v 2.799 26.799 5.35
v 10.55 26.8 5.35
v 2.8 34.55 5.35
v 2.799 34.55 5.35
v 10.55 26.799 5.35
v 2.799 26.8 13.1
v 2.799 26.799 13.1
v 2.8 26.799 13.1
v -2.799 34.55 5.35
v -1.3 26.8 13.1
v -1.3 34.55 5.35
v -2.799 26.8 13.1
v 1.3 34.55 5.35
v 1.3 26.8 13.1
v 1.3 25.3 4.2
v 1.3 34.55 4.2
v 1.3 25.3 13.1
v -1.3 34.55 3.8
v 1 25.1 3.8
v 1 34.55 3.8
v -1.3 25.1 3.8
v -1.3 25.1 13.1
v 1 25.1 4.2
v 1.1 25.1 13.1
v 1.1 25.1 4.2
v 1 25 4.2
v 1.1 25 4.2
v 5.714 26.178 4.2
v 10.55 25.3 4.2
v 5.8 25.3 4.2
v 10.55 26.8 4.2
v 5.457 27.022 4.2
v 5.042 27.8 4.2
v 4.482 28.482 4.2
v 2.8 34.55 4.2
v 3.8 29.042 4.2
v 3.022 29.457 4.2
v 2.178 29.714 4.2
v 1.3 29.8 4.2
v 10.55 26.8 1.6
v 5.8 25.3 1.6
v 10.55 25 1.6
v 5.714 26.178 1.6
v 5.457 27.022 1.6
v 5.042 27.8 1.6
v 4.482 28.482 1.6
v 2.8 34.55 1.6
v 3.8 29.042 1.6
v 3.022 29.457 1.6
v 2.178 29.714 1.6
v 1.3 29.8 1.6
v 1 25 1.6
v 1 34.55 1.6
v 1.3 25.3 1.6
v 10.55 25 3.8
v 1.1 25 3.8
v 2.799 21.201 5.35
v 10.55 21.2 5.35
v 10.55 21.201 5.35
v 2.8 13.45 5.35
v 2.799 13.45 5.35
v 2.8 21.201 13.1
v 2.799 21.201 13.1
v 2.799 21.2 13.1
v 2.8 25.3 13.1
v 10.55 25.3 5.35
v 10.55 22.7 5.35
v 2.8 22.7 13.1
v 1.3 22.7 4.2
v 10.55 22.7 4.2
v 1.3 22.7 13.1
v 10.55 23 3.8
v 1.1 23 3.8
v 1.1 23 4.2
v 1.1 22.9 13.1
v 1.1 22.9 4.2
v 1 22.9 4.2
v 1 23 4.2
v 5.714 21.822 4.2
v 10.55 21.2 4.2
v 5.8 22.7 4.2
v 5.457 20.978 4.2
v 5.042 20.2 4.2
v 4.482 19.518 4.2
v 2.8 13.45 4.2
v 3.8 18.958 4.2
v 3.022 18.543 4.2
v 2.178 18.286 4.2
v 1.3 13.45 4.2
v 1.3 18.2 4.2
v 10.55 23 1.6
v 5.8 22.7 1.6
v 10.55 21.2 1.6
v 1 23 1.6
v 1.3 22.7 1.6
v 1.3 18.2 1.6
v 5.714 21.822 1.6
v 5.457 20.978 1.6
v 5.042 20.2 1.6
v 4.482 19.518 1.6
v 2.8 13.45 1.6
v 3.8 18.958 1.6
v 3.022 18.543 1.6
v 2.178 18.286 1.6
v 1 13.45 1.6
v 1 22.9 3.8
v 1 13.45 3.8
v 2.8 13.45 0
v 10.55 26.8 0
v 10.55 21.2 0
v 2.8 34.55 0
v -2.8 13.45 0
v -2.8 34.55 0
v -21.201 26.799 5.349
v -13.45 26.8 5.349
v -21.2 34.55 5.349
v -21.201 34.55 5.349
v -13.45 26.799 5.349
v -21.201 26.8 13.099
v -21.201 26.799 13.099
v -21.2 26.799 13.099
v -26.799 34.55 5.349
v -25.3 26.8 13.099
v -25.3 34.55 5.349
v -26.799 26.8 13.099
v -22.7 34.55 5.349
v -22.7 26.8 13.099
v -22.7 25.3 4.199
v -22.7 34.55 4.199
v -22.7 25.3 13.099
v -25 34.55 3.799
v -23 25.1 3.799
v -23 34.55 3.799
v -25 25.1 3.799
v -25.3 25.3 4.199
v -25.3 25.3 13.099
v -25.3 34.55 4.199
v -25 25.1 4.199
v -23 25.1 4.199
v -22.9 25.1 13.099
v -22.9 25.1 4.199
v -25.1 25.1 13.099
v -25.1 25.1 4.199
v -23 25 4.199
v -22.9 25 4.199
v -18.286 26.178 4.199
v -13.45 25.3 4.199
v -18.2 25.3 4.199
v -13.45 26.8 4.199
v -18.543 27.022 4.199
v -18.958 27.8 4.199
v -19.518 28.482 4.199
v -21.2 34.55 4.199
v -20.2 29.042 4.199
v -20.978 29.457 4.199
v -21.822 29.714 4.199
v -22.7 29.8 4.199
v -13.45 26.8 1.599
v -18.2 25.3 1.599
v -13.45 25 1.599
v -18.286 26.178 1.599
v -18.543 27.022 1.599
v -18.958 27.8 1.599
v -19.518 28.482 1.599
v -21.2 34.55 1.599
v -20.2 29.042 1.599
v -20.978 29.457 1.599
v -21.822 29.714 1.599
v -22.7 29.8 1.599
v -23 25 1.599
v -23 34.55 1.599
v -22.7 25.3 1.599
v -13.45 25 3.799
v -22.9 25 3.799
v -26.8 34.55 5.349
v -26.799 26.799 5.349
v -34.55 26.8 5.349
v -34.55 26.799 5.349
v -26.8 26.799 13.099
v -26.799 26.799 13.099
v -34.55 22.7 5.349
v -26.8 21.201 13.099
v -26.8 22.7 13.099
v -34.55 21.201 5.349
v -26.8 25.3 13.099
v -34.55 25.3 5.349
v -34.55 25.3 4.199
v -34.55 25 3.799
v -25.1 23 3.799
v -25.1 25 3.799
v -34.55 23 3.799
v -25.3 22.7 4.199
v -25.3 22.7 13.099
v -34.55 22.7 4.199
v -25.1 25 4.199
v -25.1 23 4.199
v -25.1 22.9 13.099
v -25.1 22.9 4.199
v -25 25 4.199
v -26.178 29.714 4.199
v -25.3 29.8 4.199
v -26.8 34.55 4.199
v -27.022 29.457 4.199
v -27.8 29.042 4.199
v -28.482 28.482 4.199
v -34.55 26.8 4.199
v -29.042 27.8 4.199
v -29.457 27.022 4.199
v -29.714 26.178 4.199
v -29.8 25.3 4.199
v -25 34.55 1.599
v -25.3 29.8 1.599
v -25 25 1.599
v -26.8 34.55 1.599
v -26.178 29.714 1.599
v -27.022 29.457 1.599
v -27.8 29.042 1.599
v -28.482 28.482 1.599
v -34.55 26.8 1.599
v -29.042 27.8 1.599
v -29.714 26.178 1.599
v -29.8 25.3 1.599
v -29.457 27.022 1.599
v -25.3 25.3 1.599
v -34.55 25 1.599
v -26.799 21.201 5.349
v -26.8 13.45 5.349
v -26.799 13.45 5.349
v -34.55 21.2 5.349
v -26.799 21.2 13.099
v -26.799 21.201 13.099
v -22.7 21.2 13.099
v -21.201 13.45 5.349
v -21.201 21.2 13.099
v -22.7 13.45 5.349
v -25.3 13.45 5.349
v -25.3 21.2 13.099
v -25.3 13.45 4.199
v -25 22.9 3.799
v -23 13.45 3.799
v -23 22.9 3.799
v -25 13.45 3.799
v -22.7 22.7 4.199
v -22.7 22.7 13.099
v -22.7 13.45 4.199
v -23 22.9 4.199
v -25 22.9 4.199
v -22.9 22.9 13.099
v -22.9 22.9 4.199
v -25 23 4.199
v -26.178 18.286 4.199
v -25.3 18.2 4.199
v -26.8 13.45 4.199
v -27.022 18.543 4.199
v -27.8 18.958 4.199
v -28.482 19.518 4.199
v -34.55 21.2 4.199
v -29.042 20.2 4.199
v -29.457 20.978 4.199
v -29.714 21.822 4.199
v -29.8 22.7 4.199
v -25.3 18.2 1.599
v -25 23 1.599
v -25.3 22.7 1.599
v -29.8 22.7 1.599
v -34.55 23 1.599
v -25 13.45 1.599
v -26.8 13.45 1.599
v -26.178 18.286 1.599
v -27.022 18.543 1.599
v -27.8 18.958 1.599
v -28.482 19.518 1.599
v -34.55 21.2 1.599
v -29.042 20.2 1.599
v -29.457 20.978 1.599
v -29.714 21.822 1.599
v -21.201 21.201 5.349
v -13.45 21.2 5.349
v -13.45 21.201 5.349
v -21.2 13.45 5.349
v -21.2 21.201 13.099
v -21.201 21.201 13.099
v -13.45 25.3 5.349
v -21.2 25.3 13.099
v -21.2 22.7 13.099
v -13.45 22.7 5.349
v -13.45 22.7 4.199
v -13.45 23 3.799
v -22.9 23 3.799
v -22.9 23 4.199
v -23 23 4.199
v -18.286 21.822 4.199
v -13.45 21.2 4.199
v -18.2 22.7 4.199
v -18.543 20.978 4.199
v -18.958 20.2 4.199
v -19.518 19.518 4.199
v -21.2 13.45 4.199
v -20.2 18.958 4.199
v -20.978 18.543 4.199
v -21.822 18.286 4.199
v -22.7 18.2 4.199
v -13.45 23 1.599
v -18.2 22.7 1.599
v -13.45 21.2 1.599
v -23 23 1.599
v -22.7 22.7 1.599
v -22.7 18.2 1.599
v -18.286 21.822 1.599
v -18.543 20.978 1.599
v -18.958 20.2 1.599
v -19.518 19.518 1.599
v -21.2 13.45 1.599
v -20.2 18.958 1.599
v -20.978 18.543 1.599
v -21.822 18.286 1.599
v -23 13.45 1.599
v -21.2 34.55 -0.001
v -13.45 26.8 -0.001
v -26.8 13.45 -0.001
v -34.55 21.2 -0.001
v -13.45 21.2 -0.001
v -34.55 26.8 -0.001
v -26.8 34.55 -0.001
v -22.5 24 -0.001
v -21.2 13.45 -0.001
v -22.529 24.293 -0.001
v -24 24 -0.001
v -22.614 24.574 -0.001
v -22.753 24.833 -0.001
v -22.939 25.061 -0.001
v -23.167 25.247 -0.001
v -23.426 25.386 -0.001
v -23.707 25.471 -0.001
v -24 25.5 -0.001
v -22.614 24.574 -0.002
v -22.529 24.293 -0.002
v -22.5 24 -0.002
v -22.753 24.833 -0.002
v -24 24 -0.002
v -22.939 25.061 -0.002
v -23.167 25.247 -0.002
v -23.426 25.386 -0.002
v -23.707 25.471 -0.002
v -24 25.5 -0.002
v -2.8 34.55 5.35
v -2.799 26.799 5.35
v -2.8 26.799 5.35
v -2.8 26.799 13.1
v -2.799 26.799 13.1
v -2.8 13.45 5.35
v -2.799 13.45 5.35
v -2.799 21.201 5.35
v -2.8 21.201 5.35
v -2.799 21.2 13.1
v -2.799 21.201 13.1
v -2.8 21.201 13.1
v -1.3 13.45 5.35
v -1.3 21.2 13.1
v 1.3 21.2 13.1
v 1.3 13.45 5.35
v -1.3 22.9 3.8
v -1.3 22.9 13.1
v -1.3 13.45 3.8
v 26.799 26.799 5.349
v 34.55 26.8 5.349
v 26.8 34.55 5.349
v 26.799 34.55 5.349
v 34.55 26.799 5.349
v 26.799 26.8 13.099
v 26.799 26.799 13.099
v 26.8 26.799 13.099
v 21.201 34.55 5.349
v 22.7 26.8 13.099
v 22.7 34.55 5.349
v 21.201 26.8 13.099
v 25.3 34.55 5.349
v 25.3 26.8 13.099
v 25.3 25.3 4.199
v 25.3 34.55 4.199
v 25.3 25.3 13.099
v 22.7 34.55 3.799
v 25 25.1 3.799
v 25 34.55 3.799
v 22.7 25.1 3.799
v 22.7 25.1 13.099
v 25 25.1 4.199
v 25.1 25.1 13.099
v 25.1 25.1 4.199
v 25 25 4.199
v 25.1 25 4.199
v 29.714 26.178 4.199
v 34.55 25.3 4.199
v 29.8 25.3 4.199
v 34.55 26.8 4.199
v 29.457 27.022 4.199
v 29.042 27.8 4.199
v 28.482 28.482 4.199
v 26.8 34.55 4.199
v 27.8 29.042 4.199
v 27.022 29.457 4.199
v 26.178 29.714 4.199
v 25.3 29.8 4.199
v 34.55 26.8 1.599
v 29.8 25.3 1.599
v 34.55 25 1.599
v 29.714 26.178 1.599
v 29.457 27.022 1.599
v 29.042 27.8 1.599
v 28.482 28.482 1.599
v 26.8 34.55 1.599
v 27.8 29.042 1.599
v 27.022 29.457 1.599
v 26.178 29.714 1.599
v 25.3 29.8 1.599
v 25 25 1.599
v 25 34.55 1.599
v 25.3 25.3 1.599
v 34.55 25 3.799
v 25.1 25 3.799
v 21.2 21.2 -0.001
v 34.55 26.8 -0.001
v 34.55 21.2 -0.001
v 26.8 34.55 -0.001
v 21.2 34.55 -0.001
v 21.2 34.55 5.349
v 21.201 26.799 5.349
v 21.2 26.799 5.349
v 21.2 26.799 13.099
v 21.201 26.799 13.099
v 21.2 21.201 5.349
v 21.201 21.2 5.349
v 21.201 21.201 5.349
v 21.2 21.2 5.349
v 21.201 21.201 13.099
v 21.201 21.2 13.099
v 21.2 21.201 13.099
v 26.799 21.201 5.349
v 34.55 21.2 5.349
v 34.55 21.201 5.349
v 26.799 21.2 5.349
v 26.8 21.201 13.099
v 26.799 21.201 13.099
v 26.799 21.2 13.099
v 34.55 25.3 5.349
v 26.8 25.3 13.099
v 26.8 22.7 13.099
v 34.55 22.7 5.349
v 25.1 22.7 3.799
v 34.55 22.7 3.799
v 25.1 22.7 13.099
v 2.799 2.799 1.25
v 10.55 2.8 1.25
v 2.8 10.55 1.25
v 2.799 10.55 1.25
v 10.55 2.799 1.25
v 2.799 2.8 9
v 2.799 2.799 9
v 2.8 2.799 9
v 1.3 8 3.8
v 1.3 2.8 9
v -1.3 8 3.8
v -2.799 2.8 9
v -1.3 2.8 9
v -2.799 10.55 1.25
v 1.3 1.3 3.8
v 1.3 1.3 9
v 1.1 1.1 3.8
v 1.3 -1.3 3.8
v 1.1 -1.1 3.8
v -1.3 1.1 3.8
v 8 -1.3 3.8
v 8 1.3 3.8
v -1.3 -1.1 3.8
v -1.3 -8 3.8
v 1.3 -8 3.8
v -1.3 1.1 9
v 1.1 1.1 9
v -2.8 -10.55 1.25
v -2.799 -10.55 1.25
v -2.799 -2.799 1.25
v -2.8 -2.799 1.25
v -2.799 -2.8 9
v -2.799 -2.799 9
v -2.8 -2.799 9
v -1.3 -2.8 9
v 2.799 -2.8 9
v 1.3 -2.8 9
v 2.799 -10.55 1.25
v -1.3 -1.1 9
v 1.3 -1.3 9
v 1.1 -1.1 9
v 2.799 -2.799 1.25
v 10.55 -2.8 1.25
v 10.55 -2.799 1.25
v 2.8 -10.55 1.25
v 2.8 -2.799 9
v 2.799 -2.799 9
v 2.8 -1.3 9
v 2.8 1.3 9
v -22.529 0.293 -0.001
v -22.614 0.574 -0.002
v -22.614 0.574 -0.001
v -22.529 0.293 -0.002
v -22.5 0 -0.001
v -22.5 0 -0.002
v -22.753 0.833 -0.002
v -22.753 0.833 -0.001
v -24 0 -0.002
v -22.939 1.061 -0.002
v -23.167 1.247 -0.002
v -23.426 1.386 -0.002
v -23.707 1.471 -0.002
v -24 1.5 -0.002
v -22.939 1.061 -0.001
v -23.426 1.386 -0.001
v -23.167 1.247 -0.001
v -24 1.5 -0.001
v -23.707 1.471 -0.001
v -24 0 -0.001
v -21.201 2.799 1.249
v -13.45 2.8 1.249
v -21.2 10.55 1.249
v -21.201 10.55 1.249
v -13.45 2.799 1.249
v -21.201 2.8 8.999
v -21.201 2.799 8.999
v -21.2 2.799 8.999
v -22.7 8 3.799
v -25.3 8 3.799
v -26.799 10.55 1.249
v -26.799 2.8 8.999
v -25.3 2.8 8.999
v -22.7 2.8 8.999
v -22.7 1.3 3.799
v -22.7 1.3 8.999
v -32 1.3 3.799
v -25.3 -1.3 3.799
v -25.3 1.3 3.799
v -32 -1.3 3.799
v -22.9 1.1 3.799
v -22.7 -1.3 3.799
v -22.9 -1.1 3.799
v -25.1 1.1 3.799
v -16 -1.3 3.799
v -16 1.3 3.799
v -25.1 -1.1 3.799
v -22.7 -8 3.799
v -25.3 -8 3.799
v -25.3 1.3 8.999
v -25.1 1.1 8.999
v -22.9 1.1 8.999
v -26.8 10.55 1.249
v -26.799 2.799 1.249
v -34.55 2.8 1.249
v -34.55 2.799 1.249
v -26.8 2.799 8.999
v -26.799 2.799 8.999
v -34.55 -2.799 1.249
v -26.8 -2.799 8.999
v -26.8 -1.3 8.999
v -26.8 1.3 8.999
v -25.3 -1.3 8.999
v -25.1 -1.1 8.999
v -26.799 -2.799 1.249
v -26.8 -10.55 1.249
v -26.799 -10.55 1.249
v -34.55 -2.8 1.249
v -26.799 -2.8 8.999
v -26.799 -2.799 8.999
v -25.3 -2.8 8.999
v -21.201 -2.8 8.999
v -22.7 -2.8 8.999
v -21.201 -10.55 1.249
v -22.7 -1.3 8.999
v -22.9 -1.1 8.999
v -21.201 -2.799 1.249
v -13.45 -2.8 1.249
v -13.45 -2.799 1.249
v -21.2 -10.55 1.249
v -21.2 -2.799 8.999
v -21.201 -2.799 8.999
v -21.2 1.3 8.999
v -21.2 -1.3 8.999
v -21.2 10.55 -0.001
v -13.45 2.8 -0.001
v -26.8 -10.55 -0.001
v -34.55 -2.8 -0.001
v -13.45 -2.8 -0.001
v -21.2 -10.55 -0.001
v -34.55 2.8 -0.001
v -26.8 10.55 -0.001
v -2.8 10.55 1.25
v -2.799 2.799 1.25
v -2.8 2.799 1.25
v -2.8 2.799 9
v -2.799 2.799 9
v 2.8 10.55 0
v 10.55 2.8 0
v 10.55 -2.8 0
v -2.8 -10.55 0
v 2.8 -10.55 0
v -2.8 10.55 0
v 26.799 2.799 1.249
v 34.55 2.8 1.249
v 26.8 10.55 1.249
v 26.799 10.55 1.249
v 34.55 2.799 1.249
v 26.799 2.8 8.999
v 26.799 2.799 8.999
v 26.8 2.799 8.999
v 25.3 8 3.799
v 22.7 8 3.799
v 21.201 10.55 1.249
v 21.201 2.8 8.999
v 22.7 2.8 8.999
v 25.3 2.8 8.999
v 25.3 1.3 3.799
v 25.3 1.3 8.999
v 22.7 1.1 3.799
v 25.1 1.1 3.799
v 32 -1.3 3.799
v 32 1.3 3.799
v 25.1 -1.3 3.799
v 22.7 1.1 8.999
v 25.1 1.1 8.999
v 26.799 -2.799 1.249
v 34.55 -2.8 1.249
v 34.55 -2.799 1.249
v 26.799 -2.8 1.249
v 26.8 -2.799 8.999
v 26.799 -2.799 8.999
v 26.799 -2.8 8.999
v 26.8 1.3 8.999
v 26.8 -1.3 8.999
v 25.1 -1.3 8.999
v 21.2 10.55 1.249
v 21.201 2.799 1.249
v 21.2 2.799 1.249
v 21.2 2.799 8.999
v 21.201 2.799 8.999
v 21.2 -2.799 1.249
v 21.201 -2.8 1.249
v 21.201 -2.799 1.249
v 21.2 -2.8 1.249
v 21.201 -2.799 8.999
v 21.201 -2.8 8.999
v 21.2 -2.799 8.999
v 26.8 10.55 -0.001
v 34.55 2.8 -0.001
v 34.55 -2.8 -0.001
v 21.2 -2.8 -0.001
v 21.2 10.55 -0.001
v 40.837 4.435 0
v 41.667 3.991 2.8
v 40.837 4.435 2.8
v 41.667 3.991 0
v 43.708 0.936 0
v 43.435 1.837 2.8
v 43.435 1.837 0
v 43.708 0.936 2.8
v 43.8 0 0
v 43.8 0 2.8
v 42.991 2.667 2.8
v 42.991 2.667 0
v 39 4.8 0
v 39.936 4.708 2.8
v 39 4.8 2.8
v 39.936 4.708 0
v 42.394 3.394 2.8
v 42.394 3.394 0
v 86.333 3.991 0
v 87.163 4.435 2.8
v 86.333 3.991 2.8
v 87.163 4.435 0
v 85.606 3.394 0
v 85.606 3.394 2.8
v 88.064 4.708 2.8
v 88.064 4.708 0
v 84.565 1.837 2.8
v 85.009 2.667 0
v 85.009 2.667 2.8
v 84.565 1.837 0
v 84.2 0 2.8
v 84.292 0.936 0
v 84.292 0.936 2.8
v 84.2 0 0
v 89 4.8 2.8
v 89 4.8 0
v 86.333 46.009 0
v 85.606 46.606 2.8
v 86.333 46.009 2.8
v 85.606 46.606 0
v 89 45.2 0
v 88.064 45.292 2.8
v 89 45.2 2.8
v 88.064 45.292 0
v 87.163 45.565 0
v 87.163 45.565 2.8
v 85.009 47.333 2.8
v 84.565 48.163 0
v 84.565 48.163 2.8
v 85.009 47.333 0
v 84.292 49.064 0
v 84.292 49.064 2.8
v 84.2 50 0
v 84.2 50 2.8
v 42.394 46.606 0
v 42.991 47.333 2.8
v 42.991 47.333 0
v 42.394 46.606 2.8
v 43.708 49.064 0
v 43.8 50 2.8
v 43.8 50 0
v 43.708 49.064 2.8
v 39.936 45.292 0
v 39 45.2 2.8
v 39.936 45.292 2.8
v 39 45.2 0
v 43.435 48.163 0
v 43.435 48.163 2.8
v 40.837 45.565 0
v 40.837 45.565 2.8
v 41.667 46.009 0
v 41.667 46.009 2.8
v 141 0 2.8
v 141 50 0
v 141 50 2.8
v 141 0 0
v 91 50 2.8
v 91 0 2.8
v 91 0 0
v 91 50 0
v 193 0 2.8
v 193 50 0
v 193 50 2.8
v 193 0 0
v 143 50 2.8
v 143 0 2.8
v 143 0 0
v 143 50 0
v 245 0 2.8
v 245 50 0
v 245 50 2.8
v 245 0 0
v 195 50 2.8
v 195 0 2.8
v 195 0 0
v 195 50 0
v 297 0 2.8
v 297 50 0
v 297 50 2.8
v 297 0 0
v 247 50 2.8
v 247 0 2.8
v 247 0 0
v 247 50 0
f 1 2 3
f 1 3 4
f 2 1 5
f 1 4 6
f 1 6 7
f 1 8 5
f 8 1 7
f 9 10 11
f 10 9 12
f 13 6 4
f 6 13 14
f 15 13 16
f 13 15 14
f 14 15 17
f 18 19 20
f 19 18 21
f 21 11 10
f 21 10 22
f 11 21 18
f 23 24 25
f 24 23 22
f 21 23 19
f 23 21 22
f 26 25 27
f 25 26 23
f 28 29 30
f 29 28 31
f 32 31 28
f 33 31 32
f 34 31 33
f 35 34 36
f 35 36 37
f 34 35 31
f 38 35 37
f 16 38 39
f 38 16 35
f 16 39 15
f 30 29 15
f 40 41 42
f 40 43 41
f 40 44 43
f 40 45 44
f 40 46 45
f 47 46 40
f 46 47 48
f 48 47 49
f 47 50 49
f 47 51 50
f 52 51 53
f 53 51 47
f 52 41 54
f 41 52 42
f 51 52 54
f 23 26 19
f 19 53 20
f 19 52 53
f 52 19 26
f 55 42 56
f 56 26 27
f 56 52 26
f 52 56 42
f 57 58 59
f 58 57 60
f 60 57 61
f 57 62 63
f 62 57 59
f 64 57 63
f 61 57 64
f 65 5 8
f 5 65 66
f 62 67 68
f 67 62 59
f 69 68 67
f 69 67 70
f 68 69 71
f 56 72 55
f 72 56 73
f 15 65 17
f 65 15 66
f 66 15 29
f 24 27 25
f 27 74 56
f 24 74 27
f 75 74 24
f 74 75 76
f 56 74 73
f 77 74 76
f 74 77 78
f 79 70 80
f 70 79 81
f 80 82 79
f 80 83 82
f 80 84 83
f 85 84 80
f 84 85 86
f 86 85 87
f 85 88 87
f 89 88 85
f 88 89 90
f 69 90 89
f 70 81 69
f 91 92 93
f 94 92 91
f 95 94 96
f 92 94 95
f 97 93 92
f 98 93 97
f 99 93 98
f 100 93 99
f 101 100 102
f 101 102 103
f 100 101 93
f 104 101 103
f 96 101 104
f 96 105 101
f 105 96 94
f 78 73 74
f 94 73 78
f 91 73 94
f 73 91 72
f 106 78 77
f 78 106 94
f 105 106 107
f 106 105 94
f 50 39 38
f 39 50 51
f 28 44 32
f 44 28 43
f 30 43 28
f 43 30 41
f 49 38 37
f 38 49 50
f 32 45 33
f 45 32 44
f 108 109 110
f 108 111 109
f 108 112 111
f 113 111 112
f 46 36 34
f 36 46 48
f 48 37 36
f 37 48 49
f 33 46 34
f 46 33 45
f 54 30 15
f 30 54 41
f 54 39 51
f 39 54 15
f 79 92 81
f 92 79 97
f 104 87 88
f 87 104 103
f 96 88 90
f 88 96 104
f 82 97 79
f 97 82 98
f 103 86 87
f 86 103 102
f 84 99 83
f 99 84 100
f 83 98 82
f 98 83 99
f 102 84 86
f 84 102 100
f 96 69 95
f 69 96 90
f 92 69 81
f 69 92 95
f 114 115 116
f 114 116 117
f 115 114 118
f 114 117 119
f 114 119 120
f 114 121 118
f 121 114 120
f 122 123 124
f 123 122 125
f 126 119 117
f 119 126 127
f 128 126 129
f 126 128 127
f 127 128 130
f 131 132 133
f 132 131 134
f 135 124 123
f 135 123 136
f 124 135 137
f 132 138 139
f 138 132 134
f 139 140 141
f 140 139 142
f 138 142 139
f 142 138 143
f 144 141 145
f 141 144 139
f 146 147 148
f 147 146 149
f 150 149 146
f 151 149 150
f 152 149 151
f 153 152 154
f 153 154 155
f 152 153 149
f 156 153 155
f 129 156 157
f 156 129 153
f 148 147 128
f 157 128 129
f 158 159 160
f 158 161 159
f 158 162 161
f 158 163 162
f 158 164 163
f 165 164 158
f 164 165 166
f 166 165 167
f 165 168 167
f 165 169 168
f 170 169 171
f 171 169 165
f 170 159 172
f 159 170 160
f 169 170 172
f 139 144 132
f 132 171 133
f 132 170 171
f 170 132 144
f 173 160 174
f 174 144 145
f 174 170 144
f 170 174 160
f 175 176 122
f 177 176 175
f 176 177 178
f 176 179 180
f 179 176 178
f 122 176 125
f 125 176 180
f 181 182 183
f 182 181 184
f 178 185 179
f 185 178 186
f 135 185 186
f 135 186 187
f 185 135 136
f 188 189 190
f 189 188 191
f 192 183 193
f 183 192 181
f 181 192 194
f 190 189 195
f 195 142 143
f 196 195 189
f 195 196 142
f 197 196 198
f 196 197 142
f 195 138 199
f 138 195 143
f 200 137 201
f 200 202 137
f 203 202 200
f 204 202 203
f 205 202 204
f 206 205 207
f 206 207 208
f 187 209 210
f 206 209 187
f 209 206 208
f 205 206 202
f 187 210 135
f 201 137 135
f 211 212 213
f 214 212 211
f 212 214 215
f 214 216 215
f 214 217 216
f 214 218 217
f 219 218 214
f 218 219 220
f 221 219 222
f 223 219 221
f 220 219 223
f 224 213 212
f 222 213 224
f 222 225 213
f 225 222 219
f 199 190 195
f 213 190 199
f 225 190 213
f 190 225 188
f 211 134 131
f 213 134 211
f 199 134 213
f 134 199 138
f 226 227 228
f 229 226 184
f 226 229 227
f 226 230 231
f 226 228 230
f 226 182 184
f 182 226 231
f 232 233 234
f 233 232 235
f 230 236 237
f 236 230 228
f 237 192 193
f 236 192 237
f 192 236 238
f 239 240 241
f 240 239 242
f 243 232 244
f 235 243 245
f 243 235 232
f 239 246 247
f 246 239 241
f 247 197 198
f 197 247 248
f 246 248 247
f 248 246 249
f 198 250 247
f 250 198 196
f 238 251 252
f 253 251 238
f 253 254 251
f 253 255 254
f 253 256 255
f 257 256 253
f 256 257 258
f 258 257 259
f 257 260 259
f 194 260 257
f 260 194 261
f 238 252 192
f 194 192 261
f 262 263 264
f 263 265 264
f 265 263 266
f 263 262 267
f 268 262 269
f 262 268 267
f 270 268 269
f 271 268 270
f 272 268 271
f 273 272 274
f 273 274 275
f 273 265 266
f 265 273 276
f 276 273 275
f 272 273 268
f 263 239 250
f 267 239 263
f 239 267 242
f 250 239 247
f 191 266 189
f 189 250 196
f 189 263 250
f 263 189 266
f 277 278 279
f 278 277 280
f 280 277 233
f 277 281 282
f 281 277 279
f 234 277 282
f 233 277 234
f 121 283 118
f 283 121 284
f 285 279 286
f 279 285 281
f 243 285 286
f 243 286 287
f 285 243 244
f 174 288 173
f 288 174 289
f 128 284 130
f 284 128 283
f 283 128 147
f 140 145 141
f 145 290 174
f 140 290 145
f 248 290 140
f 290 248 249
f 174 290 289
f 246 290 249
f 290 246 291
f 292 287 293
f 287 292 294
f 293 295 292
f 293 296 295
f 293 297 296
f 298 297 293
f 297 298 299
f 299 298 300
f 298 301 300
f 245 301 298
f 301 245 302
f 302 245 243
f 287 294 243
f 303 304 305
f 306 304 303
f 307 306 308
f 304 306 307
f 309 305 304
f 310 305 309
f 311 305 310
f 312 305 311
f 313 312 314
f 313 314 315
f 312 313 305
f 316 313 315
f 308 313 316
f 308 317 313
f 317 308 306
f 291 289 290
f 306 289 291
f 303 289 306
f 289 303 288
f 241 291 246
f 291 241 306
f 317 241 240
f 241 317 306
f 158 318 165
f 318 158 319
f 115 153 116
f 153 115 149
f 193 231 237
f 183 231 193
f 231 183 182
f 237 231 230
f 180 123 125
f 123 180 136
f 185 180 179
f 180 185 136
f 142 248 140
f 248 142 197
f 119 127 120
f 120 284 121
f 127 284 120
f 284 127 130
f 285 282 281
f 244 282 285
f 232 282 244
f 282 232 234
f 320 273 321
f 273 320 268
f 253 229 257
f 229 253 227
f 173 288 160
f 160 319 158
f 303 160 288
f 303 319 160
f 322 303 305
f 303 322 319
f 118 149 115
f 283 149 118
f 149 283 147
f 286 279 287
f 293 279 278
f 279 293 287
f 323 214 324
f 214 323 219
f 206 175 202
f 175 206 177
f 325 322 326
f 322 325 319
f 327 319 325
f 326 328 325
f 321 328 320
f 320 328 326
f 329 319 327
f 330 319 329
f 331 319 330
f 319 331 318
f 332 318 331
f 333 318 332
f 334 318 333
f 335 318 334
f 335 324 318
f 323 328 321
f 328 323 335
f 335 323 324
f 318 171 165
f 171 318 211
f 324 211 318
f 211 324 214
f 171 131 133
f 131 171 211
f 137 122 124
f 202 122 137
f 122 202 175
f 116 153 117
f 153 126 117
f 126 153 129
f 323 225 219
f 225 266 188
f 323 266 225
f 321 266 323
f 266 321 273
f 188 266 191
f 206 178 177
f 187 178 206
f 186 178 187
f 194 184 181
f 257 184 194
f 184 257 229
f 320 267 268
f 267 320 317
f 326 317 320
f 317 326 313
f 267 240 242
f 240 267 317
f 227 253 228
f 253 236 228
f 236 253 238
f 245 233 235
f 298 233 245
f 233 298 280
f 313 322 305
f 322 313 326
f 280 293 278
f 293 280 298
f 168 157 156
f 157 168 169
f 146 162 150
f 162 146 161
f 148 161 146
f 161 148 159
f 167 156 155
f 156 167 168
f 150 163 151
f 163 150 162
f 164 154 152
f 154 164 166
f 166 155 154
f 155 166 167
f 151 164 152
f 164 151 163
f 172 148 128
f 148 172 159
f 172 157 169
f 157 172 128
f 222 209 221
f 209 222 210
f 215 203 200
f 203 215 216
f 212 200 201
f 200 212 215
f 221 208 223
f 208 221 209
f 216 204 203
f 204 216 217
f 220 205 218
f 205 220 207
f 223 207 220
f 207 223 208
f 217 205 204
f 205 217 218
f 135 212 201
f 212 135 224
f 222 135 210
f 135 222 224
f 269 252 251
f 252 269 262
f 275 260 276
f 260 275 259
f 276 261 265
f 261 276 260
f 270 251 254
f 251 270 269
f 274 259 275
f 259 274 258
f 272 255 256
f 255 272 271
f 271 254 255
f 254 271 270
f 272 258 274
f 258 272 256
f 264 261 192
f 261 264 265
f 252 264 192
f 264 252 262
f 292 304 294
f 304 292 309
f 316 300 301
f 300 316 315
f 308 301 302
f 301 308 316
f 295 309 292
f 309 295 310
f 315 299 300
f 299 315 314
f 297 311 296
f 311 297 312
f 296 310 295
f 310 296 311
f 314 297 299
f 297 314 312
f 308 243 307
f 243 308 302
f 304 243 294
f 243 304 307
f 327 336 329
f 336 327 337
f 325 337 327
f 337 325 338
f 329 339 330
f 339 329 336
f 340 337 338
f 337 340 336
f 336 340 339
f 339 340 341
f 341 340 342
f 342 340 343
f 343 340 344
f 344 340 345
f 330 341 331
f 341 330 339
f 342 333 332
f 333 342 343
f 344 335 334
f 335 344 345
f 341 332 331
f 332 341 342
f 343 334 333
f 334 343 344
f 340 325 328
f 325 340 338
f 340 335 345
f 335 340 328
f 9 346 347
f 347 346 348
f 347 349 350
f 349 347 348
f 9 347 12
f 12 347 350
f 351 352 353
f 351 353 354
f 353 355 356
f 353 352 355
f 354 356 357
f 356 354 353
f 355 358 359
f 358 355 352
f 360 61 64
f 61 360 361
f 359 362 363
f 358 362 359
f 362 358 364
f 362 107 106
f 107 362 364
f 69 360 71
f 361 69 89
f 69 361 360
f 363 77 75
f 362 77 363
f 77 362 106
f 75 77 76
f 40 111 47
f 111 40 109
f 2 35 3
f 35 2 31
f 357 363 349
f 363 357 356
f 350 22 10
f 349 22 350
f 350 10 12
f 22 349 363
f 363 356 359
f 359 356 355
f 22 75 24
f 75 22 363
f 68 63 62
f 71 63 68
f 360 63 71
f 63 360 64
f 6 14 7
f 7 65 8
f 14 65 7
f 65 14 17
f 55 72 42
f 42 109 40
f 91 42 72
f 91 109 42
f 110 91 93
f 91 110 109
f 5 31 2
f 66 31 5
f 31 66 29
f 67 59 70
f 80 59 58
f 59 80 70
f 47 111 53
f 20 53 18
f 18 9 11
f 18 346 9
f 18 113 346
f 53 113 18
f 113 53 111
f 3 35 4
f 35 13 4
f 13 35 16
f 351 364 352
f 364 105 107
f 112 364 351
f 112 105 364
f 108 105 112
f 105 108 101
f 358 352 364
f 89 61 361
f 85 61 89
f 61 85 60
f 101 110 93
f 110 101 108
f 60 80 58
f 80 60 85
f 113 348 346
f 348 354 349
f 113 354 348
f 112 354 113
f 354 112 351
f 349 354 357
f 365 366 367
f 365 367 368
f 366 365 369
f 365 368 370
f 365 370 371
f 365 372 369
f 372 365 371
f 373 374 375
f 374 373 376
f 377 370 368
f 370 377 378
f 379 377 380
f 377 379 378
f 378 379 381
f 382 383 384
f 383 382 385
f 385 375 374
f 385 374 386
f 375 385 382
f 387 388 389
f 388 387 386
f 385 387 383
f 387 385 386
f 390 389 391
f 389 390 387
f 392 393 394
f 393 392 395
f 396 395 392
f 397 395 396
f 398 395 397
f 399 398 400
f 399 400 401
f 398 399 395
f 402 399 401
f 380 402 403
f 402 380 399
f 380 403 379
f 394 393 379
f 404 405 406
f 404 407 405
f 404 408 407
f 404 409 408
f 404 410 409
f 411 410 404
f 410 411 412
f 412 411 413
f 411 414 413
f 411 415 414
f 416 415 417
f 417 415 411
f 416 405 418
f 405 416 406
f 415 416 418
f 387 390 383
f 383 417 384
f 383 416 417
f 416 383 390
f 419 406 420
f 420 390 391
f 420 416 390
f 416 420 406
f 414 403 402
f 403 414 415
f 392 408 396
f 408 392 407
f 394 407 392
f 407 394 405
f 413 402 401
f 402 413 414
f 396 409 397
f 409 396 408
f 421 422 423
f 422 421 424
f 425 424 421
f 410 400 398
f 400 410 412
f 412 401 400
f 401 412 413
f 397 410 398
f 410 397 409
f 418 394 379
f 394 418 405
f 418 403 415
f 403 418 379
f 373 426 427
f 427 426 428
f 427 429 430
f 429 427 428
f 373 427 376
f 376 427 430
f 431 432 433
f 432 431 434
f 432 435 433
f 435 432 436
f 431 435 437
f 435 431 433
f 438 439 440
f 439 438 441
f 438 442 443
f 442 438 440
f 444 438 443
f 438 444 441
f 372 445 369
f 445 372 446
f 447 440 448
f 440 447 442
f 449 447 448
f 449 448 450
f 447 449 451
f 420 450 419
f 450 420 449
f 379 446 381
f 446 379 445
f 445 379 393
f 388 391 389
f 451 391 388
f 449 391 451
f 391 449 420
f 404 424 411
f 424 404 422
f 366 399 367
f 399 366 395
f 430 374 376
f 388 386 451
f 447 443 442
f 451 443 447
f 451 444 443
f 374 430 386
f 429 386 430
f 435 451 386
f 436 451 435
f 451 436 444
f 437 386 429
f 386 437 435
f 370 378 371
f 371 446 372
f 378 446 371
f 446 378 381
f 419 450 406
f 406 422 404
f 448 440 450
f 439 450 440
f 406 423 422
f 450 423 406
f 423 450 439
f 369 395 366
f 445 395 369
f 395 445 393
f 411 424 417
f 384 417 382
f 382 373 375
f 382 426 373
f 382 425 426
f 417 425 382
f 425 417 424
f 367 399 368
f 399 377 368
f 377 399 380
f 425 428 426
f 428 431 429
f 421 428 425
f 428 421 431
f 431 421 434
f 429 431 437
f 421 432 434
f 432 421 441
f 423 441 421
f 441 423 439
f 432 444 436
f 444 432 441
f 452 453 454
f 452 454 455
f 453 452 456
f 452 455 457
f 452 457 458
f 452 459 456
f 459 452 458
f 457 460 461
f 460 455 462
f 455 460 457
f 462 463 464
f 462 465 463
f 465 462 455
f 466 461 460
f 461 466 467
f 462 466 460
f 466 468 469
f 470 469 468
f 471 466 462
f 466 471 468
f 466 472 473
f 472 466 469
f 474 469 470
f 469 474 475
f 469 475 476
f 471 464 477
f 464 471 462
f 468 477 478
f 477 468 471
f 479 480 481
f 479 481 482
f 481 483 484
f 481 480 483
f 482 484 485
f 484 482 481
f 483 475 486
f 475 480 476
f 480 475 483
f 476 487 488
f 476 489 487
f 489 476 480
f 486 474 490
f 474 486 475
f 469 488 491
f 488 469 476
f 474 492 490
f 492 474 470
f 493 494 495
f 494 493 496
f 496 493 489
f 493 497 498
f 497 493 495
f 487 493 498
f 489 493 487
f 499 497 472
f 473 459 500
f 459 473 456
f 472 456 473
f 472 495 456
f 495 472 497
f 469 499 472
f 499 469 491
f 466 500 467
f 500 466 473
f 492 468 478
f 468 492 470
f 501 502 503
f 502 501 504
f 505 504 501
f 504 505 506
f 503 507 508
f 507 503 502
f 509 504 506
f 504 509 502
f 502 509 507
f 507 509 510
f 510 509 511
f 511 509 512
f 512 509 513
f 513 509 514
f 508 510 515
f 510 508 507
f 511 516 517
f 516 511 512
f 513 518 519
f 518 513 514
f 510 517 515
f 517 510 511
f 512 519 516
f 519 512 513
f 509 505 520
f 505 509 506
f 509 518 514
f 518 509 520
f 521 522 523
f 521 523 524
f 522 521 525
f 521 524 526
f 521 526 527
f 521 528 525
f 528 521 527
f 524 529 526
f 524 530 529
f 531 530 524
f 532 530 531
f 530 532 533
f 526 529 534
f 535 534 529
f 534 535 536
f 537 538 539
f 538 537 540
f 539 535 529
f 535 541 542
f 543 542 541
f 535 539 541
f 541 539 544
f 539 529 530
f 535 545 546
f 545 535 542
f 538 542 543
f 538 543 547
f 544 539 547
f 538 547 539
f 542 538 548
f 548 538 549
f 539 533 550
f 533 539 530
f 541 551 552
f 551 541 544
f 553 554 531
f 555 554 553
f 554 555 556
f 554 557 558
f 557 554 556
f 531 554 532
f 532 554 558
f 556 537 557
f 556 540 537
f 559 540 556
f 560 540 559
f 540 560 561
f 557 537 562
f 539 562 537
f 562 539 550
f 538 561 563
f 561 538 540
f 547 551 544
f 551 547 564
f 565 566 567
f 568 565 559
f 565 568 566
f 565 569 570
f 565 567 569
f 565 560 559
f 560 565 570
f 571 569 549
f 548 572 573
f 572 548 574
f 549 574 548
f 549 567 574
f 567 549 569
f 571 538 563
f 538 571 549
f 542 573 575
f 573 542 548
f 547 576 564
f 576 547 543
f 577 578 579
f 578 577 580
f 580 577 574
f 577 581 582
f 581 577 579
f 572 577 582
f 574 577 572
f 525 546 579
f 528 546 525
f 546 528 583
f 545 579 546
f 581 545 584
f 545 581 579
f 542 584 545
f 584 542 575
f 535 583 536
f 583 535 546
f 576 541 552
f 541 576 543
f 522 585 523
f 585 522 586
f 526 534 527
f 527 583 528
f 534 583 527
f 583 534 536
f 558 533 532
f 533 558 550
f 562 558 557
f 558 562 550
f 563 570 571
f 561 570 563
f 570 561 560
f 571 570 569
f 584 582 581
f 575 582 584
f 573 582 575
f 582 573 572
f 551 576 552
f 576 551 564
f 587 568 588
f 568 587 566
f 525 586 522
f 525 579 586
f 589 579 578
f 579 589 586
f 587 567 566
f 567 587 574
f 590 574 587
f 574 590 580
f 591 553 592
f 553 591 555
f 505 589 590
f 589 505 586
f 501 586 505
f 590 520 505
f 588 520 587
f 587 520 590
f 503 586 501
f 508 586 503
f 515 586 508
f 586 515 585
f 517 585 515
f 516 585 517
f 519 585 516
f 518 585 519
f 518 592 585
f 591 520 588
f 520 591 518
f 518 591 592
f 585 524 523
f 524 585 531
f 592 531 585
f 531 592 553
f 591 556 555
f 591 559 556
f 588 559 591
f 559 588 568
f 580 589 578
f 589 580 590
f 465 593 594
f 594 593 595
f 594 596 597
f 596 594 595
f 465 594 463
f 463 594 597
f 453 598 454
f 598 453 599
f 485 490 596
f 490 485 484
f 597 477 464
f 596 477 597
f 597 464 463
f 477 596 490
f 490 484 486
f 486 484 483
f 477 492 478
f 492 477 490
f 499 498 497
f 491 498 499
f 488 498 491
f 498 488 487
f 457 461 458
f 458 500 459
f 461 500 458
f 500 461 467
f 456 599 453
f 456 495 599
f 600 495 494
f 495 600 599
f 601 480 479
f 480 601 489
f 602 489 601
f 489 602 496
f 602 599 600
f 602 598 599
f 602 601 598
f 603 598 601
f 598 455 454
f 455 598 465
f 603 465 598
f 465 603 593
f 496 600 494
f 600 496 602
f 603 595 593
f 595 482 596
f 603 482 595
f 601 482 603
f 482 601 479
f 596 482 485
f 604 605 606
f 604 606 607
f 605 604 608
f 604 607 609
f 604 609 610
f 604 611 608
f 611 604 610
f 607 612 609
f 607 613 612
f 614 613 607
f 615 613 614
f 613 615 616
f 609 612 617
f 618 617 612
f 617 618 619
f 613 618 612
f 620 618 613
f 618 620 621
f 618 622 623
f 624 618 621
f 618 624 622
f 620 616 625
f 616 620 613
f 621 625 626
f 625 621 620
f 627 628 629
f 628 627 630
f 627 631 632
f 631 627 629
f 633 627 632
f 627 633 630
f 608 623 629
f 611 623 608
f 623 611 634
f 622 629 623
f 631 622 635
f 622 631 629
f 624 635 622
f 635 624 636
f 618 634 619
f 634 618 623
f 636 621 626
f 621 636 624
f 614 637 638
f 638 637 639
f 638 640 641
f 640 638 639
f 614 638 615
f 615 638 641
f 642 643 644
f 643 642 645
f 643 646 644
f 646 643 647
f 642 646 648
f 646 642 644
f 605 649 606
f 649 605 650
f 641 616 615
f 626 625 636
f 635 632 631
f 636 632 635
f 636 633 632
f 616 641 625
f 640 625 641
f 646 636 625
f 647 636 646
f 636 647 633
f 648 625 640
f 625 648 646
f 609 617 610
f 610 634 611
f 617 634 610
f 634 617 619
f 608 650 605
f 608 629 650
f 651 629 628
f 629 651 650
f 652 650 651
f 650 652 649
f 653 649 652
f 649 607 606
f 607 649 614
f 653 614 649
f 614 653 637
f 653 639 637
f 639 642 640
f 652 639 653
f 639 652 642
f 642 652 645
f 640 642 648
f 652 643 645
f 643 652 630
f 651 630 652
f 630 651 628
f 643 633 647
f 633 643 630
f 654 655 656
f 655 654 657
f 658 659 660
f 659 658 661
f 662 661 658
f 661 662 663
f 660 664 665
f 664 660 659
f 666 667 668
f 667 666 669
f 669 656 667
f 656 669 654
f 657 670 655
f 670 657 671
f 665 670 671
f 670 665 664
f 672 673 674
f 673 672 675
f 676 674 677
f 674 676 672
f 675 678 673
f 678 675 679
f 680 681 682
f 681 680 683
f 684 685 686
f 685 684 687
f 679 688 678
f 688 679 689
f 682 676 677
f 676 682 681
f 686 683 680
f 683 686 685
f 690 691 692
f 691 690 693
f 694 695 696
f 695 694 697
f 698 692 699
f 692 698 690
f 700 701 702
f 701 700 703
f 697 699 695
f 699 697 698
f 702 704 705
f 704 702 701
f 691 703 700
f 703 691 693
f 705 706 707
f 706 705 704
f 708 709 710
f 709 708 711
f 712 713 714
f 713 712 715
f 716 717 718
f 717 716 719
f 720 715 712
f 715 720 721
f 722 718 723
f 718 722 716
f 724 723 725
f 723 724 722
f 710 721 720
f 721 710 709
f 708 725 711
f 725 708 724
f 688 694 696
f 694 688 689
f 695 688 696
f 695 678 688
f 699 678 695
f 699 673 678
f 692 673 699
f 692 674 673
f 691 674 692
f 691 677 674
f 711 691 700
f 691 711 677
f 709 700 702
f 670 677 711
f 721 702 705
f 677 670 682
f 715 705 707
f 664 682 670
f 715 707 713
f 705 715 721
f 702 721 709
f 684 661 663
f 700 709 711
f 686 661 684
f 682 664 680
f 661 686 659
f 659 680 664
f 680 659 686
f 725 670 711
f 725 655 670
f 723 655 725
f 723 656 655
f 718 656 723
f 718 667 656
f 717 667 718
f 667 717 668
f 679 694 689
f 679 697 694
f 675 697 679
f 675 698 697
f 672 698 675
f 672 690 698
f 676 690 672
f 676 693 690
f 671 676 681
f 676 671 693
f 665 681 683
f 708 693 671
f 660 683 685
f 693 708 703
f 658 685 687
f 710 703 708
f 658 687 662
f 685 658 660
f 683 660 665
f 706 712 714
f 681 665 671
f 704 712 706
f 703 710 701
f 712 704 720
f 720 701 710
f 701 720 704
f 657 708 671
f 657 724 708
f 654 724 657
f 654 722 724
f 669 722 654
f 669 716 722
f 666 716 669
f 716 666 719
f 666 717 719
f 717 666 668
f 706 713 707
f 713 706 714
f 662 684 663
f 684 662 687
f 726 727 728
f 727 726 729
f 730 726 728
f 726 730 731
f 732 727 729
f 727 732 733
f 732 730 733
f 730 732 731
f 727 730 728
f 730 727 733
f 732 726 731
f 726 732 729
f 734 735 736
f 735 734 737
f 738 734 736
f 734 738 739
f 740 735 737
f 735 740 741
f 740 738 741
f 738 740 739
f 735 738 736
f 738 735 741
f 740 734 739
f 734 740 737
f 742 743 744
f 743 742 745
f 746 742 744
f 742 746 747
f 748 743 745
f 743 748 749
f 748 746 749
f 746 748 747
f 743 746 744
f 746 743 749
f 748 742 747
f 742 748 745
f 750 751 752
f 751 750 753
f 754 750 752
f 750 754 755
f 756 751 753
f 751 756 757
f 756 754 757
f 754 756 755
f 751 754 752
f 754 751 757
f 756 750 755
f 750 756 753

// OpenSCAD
// 
// Shelf joining pieces (3 kinds, by cutting one design)
// Alex Hunsley
//
// Based on the shelf joining piece in the set I bought online
//

// pergola (Gordon)
//

// measurement params are per page 6 on my green notebook 2024-05-27
// See screenshot "shelf_joiners_design_and_parameters.jpg"
//



// a big value for cutaways
inf = 50;

eps = 0.001;

// thickness of 'wood grasping' parts
a = 1.5;

// base z thicknesses
b = 1.25;
c = 1.5;

d = 1;


// support pillars for 'no Y gap' design
pillar_radius = 4.5;
        
// minimises the gap at back around rear and centre part walls.
// We must have a gap somewhere, for co,pletely square pieces to work.

// wood (shelf) thickness
W = 2.8;

// gap between shelf and 'grasping' wall (on just one side)
G = -0.1;

// protrusion of the arm grippers away from centre
f = 7.75;

// 'nobble' grip radius
r = 0; // impl later
// 'nobble' sticking out amount
K = 0; // impl later

T_1 = 2 * (K + G) + W;
T_2 = 2 * G + W;

// same but including the 'grasping' walls
T_1b = T_1 + 2 * a;
T_2b = T_2 + b + c;


oct_short_edge = T_1 + 2 * a;

// base 'height' before bits go inwards at 45 deg
e = c + T_2 + b;


base_part_height = T_2b;
base_part_height_for_front_pieces = b;


x = T_1b / 2;
y = f + T_1b / 2;


// amount we cut into the 45 degree slopes
slope_cut_in = 2;

oct_poly_coords = [
                    [x, y], [y, x],
                    [y, -x], [x, -y],
                    [-x, -y], [-y, -x],
                    [-y, x], [-x, y]
                  ];


module base_for_cutting(doing_front_piece = true) {
//    total_height = T_2b + f;

    height = doing_front_piece ? base_part_height_for_front_pieces : base_part_height;

    total_height = height + f;
    
    linear_extrude(height = total_height, convexity = 1, center = false) {
        polygon(oct_poly_coords);
    }
}

// grip travel from body.
// this limits our grip to being cut away this amount from the wall.
// To reduce print time.
// To disable, set to 0.
enable_slope_cut = false;

pp = enable_slope_cut ? 2 : f;

// de-confusion helper: cuts a circle on the side that should face up or down in final construction
helper_circle_enable = true;
helper_circle_radius = 1.5;
helper_circle_depth = 0.3;

no_y_gap_fix_enabled = true;

module main(doing_front_piece = true, miss_centre_beam_angles = [], miss_quarter_cut_angles = []) {
    
    height = doing_front_piece ?  base_part_height_for_front_pieces : base_part_height;
         
    use_y_offs = no_y_gap_fix_enabled ? T_2 / 2 + d : T_2 + 0.5;  //- height - 0.75; // latter todo

    difference() {
        base_for_cutting(doing_front_piece);
        
        // cuts
        for (rot = [0 : 90 : 270]) {
            rotate([0, 0, rot]) {
        
                // cut for the upright shelf gripper (v visible ones)
                if (!in_array(rot, miss_centre_beam_angles)) {
                    translate([- T_1 / 2, (x - T_1) / 2 + d, c + use_y_offs])                            cube([T_1, inf, inf]);
                }

                // the 4 cutaways in base (more hidden)
                // big corner cut
                if (!doing_front_piece && !in_array(rot, miss_quarter_cut_angles)) {
                    translate([d, d, c - G])
                        cube([inf, inf, T_2]);
                }

                translate([0, 0, height]) {
                    // big corner cut
//                    corner_cut_y_trans = in_array(rot, miss_vertical_holder_angles) ? -inf/2 : x - eps;
                    
                    translate([x - eps, x - eps, 0])
                        cube(inf);
                    // slope cut at 45 deg
                    translate([-inf/2, x, f])
                        rotate([-45, 0, 0])
                            cube([inf, inf, inf]);
                }
                
                // little notch in the 45 degree slope
                translate([- inf / 2, T_1b / 2 + pp, height + pp])
                    cube([inf, inf, inf]);
                                
                // reduction cut similar to notch further after corner cut
                
//                translate([(T_1b + f)/2, (T_1b + f)/2, 0])
//                    cube(30);
            }
        }
    }     
    // pillars
    if (no_y_gap_fix_enabled && !doing_front_piece) {
        for (rot = [0 : 90 : 270]) {
            rotate([0, 0, rot]) {
                translate([T_1 / 2, T_1 / 2, 0])
                    quarter_cylinder(T_2b - eps, pillar_radius);
            }
        }
    }
       
    // helper circle on front/back face
    // (TODO two circles for back, one for front?)
    translate([0, 0, -eps])
        quarter_cylinder(h = helper_circle_depth + eps, r = helper_circle_radius);
}

circle_segs = 32;

module quarter_cylinder(h, r) {
    difference() {
        cylinder(h, r = r, $fn = circle_segs);
        translate([-inf/2, 0, 0])
            scale([1, -1, 1])
                cube([inf, inf, h + eps]);
        translate([0, -inf/2, 0])
            scale([-1, 1, 1])
                cube([inf, inf, h + eps]);
    }
}

piece_tx = 24;

module all_pieces(doing_front_piece = true) {
    
    translate([0, doing_front_piece ? 0 : piece_tx, 0]) {
        // piece 1 (entire piece)
        translate([-piece_tx, 0, -eps])
            main(doing_front_piece);

        // piece 2 (two quadrants)
        intersection() {
            main(doing_front_piece, miss_centre_beam_angles = [90], miss_quarter_cut_angles = [90, 180]);
            translate([-T_1b / 2, -inf/2, 0])
                cube(inf);
        }

    // piece 3 (one quadrant)
    translate([piece_tx, 0, -eps])
        intersection() {
            main(doing_front_piece, miss_centre_beam_angles = [90, 180], miss_quarter_cut_angles = [90, 180, 270]);
            translate([-T_1b / 2, -T_1b / 2, 0])
                cube(inf);
        }
    }
}

all_pieces(doing_front_piece = false);
all_pieces(doing_front_piece = true);


// We only strictly need THREE pieces!
// As long as the big flat side is facing the the user or the rear of the shelf, it works.
//
// For niceness, the user-facing pieces don't need a gap where that face is missing.
// So we need a version of all three pieces without those gap(s), so six pieces in all.


// piece 4 (one quadrant, only one upright holder, not two -- for front corner (open shelf))


//translate([2 * piece_tx, 0, -eps])
//    intersection() {
//        main(miss_centre_beam_angles = [90, 180], miss_quarter_cut_angles = [90, 180, 270],
//            miss_vertical_holder_angles = [0]);
//        translate([-T_1b / 2, -T_1b / 2, 0])
//            cube(inf);
//    }

// piece 5 -- just piece 4 mirrored in y/z plane
//translate([3 * piece_tx, 0, -eps])
//    scale([-1, 1, 1])
//        piece4();


// some rear plates

// 100 is the wood size
panel_size = 50;
panel_thickness = 2.8;

// a little give to help rotating and slotting in the panels
pillar_gap = 0.3;


for (panel_index = [1 : 5]) {
    translate([(panel_size + 2) * (panel_index - 0.25), 0, 0])
        difference() {
            cube([panel_size, panel_size, panel_thickness]);
            // only need one notched back panel per set of panels
            if (panel_index == 1) {
                union() {
                    translate([0, 0, -eps])
                        cylinder(panel_thickness + eps * 2, r = pillar_radius + pillar_gap, $fn = circle_segs);
                    translate([panel_size, 0, -eps])
                        cylinder(panel_thickness + eps * 2, r = pillar_radius + pillar_gap, $fn = circle_segs);
                    translate([panel_size, panel_size, -eps])
                        cylinder(panel_thickness + eps * 2, r = pillar_radius + pillar_gap, $fn = circle_segs);
                    translate([0, panel_size, -eps])
                        cylinder(panel_thickness + eps * 2, r = pillar_radius + pillar_gap, $fn = circle_segs);
                }
            }
        }
}


// helpers
    
function in_array(value, arr) = len(search(value, arr)) > 0;
